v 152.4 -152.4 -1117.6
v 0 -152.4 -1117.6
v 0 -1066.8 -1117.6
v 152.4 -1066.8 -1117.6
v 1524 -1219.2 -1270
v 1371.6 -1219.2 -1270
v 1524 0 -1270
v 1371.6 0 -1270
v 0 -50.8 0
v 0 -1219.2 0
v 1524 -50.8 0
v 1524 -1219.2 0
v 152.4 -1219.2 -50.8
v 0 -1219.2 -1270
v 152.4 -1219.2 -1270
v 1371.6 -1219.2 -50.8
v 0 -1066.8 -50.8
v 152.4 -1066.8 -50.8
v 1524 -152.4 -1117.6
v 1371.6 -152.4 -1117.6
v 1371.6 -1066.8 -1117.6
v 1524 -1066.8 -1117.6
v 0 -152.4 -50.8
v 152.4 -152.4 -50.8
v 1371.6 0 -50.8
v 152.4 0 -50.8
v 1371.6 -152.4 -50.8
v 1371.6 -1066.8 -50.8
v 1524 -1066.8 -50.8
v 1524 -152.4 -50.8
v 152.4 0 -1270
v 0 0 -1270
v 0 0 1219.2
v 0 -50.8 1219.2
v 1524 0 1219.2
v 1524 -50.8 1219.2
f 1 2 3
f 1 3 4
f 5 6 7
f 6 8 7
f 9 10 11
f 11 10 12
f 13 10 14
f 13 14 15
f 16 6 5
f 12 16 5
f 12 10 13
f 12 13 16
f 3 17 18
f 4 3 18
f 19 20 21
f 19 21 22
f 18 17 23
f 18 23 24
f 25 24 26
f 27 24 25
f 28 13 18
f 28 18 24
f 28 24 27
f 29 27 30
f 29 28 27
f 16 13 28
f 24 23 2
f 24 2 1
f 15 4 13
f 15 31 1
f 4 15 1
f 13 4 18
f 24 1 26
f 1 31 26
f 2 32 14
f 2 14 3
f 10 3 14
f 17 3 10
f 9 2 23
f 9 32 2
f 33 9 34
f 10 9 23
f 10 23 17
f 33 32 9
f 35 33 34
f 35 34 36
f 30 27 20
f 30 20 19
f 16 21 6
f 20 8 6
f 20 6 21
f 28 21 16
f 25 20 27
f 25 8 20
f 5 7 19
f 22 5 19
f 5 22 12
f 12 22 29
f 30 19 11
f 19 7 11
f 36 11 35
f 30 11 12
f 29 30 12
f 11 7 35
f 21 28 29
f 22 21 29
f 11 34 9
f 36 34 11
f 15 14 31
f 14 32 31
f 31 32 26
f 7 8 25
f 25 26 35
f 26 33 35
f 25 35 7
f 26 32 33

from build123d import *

# Parameters (mm, degrees)
F0_W     = 1524
F0_H     = 1219.2
F1_DEPTH = 50.8
F2_W     = 1524
F2_H     = 1219.2
F3_DEPTH = 50.8
F4_W     = 152.4
F4_H     = 152.4
F5_DEPTH = 1219.2
F6_W     = 152.4
F6_H     = 152.4
F7_DEPTH = 914.4
F8_W     = 152.4
F8_H     = 152.4
F9_DEPTH = 914.4


with BuildPart() as f1:
    # F0 (on Front) → F1 (new body)
    with BuildSketch(Plane.XZ):
        with Locations((762, 609.6)):
            Rectangle(F0_W, F0_H)
    extrude(amount=F1_DEPTH)

    # F2 (on face) → F3 (join)
    with BuildSketch(Plane(origin=(0, 0, 0), x_dir=(1, 0, 0), z_dir=(0, 0, -1))):
        with Locations((762, 609.6)):
            Rectangle(F2_W, F2_H)
    extrude(amount=F3_DEPTH)

    # F4 (on face) → F5 (join)
    with BuildSketch(Plane(origin=(0, 0, -50.8), x_dir=(1, 0, 0), z_dir=(0, 0, -1))):
        with Locations((76.2, 1143)):
            Rectangle(F4_W, F4_H)
        with Locations((1447.8, 1143)):
            Rectangle(F4_W, F4_H)
        with Locations((1447.8, 76.2)):
            Rectangle(F4_W, F4_H)
        with Locations((76.2, 76.2)):
            Rectangle(F4_W, F4_H)
    extrude(amount=F5_DEPTH)

    # F6 (on face) → F7 (join, through all)
    with BuildSketch(Plane.XZ.offset(152.4)):
        with Locations((1447.8, -1193.8)):
            Rectangle(F6_W, F6_H)
    extrude(amount=F7_DEPTH)

    # F8 (on face) → F9 (join, through all)
    with BuildSketch(Plane.XZ.offset(152.4)):
        with Locations((76.2, -1193.8)):
            Rectangle(F8_W, F8_H)
    extrude(amount=F9_DEPTH)


solid = f1.part
